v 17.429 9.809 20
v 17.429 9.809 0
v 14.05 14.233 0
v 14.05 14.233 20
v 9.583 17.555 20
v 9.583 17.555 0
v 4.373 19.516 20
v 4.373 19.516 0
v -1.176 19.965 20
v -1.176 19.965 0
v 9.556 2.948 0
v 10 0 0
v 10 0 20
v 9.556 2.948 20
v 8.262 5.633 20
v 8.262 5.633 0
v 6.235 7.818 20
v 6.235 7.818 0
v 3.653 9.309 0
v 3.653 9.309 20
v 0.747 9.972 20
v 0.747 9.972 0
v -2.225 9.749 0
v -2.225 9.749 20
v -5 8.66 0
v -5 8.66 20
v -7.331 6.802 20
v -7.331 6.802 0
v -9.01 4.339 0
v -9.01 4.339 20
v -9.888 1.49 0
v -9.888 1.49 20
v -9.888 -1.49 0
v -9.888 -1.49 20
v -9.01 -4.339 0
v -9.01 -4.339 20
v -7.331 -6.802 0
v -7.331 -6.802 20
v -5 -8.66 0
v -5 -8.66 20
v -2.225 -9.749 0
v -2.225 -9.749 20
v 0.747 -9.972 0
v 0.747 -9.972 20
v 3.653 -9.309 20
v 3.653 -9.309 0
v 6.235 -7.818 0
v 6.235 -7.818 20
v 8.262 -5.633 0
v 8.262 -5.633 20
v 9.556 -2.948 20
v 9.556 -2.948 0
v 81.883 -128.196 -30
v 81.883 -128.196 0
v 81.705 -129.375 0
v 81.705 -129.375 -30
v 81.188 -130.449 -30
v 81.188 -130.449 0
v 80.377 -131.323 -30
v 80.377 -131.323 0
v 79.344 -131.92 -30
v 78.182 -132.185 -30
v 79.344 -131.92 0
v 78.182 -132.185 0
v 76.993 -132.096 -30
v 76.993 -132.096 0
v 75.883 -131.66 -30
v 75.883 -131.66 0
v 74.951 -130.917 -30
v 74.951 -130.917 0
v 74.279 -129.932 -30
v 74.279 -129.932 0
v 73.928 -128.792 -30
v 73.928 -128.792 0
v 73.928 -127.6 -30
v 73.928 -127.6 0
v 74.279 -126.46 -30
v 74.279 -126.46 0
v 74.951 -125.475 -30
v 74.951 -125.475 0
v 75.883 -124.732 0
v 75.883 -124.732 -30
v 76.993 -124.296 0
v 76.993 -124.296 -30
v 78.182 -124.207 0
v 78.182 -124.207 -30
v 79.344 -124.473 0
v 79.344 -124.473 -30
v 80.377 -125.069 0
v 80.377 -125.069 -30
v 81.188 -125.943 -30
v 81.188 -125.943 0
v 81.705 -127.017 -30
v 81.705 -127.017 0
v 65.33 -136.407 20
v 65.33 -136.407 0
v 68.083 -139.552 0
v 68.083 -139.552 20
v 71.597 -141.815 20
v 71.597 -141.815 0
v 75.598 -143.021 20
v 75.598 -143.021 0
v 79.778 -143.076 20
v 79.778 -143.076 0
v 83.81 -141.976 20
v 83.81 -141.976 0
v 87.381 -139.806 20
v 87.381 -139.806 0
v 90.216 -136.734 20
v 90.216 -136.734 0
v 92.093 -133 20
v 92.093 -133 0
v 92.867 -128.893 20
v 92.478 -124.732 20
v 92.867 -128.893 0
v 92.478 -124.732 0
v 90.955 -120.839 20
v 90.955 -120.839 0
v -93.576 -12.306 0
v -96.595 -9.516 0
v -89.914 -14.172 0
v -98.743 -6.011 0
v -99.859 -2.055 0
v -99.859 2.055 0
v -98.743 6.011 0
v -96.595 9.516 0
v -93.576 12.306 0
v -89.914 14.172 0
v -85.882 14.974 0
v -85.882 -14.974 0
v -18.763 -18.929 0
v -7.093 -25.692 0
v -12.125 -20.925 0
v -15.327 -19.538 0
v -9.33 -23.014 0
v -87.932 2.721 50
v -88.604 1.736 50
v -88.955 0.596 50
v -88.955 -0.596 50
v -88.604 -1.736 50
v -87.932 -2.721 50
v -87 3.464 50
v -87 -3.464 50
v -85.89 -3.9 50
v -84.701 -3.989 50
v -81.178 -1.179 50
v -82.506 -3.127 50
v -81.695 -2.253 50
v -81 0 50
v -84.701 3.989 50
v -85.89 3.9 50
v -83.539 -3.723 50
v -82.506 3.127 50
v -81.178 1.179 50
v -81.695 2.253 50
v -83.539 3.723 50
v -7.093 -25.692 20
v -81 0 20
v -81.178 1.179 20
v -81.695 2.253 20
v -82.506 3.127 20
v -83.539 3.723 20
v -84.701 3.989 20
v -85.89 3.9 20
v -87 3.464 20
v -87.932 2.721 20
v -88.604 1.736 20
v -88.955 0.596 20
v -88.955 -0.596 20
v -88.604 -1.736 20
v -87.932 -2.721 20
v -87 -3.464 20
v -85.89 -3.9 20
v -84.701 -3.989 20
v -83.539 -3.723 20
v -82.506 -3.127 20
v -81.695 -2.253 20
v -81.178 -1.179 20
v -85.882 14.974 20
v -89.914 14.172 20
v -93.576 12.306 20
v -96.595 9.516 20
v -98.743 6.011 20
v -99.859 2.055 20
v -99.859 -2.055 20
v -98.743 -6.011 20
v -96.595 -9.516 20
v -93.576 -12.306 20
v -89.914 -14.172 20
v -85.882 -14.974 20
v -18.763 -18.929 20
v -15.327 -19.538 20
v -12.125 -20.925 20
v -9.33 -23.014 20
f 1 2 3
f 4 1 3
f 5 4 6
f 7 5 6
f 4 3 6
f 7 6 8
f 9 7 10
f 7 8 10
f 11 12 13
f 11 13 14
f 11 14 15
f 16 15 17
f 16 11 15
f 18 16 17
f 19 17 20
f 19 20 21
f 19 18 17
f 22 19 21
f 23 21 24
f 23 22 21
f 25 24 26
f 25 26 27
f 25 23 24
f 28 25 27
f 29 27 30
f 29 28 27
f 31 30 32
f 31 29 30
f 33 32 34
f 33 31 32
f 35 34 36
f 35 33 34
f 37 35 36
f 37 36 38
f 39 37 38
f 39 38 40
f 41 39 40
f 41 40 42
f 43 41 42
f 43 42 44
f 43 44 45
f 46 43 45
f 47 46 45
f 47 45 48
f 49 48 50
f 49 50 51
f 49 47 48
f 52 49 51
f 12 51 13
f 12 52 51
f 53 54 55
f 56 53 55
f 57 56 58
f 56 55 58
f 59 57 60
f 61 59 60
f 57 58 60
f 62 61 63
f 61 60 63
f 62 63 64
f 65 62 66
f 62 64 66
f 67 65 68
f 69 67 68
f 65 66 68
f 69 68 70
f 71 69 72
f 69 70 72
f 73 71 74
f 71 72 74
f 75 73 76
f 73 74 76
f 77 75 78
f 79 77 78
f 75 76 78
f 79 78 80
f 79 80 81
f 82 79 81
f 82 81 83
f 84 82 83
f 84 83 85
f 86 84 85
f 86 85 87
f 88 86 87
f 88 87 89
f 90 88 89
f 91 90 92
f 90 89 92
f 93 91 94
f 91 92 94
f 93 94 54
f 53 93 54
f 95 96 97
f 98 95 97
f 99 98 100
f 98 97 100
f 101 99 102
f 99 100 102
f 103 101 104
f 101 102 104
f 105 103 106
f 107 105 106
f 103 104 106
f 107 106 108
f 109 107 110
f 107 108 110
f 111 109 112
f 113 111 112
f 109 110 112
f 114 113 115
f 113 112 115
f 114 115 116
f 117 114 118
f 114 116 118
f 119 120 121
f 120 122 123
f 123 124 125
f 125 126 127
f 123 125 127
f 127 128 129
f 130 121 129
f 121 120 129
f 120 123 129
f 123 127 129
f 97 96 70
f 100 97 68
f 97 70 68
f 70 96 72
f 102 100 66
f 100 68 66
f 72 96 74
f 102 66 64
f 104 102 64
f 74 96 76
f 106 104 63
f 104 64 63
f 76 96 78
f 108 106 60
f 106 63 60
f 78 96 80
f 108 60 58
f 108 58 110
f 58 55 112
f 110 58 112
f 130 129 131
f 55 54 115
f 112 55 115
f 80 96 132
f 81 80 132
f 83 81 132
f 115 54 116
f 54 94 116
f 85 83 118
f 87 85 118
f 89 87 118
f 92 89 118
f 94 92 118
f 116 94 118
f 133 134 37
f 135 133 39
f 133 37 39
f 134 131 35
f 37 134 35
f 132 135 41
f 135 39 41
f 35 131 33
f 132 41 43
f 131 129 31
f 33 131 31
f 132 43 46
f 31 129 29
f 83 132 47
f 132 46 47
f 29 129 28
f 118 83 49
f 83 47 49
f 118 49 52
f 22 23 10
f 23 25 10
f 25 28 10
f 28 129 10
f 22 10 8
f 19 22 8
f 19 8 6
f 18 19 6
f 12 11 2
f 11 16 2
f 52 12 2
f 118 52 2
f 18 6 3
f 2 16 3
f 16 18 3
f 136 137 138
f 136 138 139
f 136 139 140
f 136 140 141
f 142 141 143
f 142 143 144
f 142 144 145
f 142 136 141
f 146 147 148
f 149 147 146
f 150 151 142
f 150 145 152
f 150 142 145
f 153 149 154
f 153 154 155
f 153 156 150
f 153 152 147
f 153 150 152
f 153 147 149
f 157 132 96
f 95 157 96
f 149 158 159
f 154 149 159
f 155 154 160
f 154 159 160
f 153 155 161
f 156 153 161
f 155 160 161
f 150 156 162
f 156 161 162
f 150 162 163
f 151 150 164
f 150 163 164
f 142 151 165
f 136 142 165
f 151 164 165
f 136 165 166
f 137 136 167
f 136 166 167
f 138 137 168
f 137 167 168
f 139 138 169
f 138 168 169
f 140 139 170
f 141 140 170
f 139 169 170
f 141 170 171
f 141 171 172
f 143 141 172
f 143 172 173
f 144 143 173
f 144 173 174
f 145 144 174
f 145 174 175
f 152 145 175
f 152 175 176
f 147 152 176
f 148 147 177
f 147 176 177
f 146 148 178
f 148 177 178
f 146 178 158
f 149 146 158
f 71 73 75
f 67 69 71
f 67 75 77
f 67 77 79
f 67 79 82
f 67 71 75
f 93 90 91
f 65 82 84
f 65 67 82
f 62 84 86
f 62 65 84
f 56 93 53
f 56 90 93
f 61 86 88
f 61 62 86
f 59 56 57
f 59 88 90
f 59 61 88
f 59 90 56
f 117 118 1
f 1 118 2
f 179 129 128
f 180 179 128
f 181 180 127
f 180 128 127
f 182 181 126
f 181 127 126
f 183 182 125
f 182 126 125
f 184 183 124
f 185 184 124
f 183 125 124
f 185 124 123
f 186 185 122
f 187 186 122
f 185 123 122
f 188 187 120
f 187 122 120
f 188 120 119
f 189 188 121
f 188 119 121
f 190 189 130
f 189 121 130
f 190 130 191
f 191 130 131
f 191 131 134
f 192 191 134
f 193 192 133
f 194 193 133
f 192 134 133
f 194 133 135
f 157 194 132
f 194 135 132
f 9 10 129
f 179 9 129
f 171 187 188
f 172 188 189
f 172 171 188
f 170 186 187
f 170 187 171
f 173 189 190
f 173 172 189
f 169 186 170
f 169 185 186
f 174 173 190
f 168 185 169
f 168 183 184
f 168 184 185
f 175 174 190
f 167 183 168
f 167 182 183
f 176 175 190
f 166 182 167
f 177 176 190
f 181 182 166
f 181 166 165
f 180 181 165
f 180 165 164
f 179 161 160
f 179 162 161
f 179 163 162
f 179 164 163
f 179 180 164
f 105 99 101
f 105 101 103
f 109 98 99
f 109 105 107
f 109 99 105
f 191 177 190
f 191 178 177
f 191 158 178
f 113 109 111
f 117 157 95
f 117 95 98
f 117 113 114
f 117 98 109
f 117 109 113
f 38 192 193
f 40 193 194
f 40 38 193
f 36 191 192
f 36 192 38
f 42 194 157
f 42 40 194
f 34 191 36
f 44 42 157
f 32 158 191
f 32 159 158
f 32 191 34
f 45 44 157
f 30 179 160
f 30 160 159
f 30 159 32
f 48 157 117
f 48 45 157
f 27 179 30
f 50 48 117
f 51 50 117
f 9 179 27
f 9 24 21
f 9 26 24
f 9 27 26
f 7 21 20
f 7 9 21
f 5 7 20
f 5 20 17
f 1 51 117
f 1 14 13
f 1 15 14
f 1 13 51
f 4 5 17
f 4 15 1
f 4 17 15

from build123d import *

# Parameters (mm, degrees)
EXTRUDE_1_DEPTH     = 20
SKETCH_2_R          = 10
CUT_EXTRUDE_1_DEPTH = 20
SKETCH_6_R          = 4
EXTRUDE_3_DEPTH     = 30
SKETCH_7_R          = 4
EXTRUDE_4_DEPTH     = 30


with BuildPart() as part:
    # 草图1 → 凸台-拉伸1 (new body)
    with BuildSketch(Plane.XY):
        with BuildLine():
            Line((-1.176470588, 19.965367939), (-85.882352941, 14.974025955))
            ThreePointArc((-85.882352941, 14.974025955), (-100, 0), (-85.882352941, -14.974025955))
            Line((-85.882352941, -14.974025955), (-18.763483586, -18.92904326))
            ThreePointArc((-18.763483586, -18.92904326), (-12.125205702, -20.924621234), (-7.09296905, -25.691764928))
            Line((-7.09296905, -25.691764928), (65.330255198, -136.407322955))
            ThreePointArc((65.330255198, -136.407322955), (85.671434943, -141.015620535), (90.955210971, -120.839354505))
            Line((90.955210971, -120.839354505), (17.42945106, 9.80888555))
            ThreePointArc((17.42945106, 9.80888555), (9.582712413, 17.554817653), (-1.176470588, 19.965367939))
        make_face()
    extrude(amount=EXTRUDE_1_DEPTH)

    # 草图2 → 切除-拉伸1 (cut)
    with BuildSketch(Plane.XY):
        Circle(SKETCH_2_R)
    extrude(amount=CUT_EXTRUDE_1_DEPTH, mode=Mode.SUBTRACT)

    # 草图6 → 凸台-拉伸3 (add)
    with BuildSketch(Plane.XY.offset(20)):
        with Locations((-85, 0)):
            Circle(SKETCH_6_R)
    extrude(amount=EXTRUDE_3_DEPTH)

    # 草图7 → 凸台-拉伸4 (add)
    with BuildSketch(Plane(origin=(0, 0, 0), x_dir=(-1, 0, 0), z_dir=(0, 0, -1))):
        with Locations(Location((-77.883122675, -128.196018668, 0), (0, 0, 180))):
            Circle(SKETCH_7_R)
    extrude(amount=EXTRUDE_4_DEPTH)


solid = part.part
